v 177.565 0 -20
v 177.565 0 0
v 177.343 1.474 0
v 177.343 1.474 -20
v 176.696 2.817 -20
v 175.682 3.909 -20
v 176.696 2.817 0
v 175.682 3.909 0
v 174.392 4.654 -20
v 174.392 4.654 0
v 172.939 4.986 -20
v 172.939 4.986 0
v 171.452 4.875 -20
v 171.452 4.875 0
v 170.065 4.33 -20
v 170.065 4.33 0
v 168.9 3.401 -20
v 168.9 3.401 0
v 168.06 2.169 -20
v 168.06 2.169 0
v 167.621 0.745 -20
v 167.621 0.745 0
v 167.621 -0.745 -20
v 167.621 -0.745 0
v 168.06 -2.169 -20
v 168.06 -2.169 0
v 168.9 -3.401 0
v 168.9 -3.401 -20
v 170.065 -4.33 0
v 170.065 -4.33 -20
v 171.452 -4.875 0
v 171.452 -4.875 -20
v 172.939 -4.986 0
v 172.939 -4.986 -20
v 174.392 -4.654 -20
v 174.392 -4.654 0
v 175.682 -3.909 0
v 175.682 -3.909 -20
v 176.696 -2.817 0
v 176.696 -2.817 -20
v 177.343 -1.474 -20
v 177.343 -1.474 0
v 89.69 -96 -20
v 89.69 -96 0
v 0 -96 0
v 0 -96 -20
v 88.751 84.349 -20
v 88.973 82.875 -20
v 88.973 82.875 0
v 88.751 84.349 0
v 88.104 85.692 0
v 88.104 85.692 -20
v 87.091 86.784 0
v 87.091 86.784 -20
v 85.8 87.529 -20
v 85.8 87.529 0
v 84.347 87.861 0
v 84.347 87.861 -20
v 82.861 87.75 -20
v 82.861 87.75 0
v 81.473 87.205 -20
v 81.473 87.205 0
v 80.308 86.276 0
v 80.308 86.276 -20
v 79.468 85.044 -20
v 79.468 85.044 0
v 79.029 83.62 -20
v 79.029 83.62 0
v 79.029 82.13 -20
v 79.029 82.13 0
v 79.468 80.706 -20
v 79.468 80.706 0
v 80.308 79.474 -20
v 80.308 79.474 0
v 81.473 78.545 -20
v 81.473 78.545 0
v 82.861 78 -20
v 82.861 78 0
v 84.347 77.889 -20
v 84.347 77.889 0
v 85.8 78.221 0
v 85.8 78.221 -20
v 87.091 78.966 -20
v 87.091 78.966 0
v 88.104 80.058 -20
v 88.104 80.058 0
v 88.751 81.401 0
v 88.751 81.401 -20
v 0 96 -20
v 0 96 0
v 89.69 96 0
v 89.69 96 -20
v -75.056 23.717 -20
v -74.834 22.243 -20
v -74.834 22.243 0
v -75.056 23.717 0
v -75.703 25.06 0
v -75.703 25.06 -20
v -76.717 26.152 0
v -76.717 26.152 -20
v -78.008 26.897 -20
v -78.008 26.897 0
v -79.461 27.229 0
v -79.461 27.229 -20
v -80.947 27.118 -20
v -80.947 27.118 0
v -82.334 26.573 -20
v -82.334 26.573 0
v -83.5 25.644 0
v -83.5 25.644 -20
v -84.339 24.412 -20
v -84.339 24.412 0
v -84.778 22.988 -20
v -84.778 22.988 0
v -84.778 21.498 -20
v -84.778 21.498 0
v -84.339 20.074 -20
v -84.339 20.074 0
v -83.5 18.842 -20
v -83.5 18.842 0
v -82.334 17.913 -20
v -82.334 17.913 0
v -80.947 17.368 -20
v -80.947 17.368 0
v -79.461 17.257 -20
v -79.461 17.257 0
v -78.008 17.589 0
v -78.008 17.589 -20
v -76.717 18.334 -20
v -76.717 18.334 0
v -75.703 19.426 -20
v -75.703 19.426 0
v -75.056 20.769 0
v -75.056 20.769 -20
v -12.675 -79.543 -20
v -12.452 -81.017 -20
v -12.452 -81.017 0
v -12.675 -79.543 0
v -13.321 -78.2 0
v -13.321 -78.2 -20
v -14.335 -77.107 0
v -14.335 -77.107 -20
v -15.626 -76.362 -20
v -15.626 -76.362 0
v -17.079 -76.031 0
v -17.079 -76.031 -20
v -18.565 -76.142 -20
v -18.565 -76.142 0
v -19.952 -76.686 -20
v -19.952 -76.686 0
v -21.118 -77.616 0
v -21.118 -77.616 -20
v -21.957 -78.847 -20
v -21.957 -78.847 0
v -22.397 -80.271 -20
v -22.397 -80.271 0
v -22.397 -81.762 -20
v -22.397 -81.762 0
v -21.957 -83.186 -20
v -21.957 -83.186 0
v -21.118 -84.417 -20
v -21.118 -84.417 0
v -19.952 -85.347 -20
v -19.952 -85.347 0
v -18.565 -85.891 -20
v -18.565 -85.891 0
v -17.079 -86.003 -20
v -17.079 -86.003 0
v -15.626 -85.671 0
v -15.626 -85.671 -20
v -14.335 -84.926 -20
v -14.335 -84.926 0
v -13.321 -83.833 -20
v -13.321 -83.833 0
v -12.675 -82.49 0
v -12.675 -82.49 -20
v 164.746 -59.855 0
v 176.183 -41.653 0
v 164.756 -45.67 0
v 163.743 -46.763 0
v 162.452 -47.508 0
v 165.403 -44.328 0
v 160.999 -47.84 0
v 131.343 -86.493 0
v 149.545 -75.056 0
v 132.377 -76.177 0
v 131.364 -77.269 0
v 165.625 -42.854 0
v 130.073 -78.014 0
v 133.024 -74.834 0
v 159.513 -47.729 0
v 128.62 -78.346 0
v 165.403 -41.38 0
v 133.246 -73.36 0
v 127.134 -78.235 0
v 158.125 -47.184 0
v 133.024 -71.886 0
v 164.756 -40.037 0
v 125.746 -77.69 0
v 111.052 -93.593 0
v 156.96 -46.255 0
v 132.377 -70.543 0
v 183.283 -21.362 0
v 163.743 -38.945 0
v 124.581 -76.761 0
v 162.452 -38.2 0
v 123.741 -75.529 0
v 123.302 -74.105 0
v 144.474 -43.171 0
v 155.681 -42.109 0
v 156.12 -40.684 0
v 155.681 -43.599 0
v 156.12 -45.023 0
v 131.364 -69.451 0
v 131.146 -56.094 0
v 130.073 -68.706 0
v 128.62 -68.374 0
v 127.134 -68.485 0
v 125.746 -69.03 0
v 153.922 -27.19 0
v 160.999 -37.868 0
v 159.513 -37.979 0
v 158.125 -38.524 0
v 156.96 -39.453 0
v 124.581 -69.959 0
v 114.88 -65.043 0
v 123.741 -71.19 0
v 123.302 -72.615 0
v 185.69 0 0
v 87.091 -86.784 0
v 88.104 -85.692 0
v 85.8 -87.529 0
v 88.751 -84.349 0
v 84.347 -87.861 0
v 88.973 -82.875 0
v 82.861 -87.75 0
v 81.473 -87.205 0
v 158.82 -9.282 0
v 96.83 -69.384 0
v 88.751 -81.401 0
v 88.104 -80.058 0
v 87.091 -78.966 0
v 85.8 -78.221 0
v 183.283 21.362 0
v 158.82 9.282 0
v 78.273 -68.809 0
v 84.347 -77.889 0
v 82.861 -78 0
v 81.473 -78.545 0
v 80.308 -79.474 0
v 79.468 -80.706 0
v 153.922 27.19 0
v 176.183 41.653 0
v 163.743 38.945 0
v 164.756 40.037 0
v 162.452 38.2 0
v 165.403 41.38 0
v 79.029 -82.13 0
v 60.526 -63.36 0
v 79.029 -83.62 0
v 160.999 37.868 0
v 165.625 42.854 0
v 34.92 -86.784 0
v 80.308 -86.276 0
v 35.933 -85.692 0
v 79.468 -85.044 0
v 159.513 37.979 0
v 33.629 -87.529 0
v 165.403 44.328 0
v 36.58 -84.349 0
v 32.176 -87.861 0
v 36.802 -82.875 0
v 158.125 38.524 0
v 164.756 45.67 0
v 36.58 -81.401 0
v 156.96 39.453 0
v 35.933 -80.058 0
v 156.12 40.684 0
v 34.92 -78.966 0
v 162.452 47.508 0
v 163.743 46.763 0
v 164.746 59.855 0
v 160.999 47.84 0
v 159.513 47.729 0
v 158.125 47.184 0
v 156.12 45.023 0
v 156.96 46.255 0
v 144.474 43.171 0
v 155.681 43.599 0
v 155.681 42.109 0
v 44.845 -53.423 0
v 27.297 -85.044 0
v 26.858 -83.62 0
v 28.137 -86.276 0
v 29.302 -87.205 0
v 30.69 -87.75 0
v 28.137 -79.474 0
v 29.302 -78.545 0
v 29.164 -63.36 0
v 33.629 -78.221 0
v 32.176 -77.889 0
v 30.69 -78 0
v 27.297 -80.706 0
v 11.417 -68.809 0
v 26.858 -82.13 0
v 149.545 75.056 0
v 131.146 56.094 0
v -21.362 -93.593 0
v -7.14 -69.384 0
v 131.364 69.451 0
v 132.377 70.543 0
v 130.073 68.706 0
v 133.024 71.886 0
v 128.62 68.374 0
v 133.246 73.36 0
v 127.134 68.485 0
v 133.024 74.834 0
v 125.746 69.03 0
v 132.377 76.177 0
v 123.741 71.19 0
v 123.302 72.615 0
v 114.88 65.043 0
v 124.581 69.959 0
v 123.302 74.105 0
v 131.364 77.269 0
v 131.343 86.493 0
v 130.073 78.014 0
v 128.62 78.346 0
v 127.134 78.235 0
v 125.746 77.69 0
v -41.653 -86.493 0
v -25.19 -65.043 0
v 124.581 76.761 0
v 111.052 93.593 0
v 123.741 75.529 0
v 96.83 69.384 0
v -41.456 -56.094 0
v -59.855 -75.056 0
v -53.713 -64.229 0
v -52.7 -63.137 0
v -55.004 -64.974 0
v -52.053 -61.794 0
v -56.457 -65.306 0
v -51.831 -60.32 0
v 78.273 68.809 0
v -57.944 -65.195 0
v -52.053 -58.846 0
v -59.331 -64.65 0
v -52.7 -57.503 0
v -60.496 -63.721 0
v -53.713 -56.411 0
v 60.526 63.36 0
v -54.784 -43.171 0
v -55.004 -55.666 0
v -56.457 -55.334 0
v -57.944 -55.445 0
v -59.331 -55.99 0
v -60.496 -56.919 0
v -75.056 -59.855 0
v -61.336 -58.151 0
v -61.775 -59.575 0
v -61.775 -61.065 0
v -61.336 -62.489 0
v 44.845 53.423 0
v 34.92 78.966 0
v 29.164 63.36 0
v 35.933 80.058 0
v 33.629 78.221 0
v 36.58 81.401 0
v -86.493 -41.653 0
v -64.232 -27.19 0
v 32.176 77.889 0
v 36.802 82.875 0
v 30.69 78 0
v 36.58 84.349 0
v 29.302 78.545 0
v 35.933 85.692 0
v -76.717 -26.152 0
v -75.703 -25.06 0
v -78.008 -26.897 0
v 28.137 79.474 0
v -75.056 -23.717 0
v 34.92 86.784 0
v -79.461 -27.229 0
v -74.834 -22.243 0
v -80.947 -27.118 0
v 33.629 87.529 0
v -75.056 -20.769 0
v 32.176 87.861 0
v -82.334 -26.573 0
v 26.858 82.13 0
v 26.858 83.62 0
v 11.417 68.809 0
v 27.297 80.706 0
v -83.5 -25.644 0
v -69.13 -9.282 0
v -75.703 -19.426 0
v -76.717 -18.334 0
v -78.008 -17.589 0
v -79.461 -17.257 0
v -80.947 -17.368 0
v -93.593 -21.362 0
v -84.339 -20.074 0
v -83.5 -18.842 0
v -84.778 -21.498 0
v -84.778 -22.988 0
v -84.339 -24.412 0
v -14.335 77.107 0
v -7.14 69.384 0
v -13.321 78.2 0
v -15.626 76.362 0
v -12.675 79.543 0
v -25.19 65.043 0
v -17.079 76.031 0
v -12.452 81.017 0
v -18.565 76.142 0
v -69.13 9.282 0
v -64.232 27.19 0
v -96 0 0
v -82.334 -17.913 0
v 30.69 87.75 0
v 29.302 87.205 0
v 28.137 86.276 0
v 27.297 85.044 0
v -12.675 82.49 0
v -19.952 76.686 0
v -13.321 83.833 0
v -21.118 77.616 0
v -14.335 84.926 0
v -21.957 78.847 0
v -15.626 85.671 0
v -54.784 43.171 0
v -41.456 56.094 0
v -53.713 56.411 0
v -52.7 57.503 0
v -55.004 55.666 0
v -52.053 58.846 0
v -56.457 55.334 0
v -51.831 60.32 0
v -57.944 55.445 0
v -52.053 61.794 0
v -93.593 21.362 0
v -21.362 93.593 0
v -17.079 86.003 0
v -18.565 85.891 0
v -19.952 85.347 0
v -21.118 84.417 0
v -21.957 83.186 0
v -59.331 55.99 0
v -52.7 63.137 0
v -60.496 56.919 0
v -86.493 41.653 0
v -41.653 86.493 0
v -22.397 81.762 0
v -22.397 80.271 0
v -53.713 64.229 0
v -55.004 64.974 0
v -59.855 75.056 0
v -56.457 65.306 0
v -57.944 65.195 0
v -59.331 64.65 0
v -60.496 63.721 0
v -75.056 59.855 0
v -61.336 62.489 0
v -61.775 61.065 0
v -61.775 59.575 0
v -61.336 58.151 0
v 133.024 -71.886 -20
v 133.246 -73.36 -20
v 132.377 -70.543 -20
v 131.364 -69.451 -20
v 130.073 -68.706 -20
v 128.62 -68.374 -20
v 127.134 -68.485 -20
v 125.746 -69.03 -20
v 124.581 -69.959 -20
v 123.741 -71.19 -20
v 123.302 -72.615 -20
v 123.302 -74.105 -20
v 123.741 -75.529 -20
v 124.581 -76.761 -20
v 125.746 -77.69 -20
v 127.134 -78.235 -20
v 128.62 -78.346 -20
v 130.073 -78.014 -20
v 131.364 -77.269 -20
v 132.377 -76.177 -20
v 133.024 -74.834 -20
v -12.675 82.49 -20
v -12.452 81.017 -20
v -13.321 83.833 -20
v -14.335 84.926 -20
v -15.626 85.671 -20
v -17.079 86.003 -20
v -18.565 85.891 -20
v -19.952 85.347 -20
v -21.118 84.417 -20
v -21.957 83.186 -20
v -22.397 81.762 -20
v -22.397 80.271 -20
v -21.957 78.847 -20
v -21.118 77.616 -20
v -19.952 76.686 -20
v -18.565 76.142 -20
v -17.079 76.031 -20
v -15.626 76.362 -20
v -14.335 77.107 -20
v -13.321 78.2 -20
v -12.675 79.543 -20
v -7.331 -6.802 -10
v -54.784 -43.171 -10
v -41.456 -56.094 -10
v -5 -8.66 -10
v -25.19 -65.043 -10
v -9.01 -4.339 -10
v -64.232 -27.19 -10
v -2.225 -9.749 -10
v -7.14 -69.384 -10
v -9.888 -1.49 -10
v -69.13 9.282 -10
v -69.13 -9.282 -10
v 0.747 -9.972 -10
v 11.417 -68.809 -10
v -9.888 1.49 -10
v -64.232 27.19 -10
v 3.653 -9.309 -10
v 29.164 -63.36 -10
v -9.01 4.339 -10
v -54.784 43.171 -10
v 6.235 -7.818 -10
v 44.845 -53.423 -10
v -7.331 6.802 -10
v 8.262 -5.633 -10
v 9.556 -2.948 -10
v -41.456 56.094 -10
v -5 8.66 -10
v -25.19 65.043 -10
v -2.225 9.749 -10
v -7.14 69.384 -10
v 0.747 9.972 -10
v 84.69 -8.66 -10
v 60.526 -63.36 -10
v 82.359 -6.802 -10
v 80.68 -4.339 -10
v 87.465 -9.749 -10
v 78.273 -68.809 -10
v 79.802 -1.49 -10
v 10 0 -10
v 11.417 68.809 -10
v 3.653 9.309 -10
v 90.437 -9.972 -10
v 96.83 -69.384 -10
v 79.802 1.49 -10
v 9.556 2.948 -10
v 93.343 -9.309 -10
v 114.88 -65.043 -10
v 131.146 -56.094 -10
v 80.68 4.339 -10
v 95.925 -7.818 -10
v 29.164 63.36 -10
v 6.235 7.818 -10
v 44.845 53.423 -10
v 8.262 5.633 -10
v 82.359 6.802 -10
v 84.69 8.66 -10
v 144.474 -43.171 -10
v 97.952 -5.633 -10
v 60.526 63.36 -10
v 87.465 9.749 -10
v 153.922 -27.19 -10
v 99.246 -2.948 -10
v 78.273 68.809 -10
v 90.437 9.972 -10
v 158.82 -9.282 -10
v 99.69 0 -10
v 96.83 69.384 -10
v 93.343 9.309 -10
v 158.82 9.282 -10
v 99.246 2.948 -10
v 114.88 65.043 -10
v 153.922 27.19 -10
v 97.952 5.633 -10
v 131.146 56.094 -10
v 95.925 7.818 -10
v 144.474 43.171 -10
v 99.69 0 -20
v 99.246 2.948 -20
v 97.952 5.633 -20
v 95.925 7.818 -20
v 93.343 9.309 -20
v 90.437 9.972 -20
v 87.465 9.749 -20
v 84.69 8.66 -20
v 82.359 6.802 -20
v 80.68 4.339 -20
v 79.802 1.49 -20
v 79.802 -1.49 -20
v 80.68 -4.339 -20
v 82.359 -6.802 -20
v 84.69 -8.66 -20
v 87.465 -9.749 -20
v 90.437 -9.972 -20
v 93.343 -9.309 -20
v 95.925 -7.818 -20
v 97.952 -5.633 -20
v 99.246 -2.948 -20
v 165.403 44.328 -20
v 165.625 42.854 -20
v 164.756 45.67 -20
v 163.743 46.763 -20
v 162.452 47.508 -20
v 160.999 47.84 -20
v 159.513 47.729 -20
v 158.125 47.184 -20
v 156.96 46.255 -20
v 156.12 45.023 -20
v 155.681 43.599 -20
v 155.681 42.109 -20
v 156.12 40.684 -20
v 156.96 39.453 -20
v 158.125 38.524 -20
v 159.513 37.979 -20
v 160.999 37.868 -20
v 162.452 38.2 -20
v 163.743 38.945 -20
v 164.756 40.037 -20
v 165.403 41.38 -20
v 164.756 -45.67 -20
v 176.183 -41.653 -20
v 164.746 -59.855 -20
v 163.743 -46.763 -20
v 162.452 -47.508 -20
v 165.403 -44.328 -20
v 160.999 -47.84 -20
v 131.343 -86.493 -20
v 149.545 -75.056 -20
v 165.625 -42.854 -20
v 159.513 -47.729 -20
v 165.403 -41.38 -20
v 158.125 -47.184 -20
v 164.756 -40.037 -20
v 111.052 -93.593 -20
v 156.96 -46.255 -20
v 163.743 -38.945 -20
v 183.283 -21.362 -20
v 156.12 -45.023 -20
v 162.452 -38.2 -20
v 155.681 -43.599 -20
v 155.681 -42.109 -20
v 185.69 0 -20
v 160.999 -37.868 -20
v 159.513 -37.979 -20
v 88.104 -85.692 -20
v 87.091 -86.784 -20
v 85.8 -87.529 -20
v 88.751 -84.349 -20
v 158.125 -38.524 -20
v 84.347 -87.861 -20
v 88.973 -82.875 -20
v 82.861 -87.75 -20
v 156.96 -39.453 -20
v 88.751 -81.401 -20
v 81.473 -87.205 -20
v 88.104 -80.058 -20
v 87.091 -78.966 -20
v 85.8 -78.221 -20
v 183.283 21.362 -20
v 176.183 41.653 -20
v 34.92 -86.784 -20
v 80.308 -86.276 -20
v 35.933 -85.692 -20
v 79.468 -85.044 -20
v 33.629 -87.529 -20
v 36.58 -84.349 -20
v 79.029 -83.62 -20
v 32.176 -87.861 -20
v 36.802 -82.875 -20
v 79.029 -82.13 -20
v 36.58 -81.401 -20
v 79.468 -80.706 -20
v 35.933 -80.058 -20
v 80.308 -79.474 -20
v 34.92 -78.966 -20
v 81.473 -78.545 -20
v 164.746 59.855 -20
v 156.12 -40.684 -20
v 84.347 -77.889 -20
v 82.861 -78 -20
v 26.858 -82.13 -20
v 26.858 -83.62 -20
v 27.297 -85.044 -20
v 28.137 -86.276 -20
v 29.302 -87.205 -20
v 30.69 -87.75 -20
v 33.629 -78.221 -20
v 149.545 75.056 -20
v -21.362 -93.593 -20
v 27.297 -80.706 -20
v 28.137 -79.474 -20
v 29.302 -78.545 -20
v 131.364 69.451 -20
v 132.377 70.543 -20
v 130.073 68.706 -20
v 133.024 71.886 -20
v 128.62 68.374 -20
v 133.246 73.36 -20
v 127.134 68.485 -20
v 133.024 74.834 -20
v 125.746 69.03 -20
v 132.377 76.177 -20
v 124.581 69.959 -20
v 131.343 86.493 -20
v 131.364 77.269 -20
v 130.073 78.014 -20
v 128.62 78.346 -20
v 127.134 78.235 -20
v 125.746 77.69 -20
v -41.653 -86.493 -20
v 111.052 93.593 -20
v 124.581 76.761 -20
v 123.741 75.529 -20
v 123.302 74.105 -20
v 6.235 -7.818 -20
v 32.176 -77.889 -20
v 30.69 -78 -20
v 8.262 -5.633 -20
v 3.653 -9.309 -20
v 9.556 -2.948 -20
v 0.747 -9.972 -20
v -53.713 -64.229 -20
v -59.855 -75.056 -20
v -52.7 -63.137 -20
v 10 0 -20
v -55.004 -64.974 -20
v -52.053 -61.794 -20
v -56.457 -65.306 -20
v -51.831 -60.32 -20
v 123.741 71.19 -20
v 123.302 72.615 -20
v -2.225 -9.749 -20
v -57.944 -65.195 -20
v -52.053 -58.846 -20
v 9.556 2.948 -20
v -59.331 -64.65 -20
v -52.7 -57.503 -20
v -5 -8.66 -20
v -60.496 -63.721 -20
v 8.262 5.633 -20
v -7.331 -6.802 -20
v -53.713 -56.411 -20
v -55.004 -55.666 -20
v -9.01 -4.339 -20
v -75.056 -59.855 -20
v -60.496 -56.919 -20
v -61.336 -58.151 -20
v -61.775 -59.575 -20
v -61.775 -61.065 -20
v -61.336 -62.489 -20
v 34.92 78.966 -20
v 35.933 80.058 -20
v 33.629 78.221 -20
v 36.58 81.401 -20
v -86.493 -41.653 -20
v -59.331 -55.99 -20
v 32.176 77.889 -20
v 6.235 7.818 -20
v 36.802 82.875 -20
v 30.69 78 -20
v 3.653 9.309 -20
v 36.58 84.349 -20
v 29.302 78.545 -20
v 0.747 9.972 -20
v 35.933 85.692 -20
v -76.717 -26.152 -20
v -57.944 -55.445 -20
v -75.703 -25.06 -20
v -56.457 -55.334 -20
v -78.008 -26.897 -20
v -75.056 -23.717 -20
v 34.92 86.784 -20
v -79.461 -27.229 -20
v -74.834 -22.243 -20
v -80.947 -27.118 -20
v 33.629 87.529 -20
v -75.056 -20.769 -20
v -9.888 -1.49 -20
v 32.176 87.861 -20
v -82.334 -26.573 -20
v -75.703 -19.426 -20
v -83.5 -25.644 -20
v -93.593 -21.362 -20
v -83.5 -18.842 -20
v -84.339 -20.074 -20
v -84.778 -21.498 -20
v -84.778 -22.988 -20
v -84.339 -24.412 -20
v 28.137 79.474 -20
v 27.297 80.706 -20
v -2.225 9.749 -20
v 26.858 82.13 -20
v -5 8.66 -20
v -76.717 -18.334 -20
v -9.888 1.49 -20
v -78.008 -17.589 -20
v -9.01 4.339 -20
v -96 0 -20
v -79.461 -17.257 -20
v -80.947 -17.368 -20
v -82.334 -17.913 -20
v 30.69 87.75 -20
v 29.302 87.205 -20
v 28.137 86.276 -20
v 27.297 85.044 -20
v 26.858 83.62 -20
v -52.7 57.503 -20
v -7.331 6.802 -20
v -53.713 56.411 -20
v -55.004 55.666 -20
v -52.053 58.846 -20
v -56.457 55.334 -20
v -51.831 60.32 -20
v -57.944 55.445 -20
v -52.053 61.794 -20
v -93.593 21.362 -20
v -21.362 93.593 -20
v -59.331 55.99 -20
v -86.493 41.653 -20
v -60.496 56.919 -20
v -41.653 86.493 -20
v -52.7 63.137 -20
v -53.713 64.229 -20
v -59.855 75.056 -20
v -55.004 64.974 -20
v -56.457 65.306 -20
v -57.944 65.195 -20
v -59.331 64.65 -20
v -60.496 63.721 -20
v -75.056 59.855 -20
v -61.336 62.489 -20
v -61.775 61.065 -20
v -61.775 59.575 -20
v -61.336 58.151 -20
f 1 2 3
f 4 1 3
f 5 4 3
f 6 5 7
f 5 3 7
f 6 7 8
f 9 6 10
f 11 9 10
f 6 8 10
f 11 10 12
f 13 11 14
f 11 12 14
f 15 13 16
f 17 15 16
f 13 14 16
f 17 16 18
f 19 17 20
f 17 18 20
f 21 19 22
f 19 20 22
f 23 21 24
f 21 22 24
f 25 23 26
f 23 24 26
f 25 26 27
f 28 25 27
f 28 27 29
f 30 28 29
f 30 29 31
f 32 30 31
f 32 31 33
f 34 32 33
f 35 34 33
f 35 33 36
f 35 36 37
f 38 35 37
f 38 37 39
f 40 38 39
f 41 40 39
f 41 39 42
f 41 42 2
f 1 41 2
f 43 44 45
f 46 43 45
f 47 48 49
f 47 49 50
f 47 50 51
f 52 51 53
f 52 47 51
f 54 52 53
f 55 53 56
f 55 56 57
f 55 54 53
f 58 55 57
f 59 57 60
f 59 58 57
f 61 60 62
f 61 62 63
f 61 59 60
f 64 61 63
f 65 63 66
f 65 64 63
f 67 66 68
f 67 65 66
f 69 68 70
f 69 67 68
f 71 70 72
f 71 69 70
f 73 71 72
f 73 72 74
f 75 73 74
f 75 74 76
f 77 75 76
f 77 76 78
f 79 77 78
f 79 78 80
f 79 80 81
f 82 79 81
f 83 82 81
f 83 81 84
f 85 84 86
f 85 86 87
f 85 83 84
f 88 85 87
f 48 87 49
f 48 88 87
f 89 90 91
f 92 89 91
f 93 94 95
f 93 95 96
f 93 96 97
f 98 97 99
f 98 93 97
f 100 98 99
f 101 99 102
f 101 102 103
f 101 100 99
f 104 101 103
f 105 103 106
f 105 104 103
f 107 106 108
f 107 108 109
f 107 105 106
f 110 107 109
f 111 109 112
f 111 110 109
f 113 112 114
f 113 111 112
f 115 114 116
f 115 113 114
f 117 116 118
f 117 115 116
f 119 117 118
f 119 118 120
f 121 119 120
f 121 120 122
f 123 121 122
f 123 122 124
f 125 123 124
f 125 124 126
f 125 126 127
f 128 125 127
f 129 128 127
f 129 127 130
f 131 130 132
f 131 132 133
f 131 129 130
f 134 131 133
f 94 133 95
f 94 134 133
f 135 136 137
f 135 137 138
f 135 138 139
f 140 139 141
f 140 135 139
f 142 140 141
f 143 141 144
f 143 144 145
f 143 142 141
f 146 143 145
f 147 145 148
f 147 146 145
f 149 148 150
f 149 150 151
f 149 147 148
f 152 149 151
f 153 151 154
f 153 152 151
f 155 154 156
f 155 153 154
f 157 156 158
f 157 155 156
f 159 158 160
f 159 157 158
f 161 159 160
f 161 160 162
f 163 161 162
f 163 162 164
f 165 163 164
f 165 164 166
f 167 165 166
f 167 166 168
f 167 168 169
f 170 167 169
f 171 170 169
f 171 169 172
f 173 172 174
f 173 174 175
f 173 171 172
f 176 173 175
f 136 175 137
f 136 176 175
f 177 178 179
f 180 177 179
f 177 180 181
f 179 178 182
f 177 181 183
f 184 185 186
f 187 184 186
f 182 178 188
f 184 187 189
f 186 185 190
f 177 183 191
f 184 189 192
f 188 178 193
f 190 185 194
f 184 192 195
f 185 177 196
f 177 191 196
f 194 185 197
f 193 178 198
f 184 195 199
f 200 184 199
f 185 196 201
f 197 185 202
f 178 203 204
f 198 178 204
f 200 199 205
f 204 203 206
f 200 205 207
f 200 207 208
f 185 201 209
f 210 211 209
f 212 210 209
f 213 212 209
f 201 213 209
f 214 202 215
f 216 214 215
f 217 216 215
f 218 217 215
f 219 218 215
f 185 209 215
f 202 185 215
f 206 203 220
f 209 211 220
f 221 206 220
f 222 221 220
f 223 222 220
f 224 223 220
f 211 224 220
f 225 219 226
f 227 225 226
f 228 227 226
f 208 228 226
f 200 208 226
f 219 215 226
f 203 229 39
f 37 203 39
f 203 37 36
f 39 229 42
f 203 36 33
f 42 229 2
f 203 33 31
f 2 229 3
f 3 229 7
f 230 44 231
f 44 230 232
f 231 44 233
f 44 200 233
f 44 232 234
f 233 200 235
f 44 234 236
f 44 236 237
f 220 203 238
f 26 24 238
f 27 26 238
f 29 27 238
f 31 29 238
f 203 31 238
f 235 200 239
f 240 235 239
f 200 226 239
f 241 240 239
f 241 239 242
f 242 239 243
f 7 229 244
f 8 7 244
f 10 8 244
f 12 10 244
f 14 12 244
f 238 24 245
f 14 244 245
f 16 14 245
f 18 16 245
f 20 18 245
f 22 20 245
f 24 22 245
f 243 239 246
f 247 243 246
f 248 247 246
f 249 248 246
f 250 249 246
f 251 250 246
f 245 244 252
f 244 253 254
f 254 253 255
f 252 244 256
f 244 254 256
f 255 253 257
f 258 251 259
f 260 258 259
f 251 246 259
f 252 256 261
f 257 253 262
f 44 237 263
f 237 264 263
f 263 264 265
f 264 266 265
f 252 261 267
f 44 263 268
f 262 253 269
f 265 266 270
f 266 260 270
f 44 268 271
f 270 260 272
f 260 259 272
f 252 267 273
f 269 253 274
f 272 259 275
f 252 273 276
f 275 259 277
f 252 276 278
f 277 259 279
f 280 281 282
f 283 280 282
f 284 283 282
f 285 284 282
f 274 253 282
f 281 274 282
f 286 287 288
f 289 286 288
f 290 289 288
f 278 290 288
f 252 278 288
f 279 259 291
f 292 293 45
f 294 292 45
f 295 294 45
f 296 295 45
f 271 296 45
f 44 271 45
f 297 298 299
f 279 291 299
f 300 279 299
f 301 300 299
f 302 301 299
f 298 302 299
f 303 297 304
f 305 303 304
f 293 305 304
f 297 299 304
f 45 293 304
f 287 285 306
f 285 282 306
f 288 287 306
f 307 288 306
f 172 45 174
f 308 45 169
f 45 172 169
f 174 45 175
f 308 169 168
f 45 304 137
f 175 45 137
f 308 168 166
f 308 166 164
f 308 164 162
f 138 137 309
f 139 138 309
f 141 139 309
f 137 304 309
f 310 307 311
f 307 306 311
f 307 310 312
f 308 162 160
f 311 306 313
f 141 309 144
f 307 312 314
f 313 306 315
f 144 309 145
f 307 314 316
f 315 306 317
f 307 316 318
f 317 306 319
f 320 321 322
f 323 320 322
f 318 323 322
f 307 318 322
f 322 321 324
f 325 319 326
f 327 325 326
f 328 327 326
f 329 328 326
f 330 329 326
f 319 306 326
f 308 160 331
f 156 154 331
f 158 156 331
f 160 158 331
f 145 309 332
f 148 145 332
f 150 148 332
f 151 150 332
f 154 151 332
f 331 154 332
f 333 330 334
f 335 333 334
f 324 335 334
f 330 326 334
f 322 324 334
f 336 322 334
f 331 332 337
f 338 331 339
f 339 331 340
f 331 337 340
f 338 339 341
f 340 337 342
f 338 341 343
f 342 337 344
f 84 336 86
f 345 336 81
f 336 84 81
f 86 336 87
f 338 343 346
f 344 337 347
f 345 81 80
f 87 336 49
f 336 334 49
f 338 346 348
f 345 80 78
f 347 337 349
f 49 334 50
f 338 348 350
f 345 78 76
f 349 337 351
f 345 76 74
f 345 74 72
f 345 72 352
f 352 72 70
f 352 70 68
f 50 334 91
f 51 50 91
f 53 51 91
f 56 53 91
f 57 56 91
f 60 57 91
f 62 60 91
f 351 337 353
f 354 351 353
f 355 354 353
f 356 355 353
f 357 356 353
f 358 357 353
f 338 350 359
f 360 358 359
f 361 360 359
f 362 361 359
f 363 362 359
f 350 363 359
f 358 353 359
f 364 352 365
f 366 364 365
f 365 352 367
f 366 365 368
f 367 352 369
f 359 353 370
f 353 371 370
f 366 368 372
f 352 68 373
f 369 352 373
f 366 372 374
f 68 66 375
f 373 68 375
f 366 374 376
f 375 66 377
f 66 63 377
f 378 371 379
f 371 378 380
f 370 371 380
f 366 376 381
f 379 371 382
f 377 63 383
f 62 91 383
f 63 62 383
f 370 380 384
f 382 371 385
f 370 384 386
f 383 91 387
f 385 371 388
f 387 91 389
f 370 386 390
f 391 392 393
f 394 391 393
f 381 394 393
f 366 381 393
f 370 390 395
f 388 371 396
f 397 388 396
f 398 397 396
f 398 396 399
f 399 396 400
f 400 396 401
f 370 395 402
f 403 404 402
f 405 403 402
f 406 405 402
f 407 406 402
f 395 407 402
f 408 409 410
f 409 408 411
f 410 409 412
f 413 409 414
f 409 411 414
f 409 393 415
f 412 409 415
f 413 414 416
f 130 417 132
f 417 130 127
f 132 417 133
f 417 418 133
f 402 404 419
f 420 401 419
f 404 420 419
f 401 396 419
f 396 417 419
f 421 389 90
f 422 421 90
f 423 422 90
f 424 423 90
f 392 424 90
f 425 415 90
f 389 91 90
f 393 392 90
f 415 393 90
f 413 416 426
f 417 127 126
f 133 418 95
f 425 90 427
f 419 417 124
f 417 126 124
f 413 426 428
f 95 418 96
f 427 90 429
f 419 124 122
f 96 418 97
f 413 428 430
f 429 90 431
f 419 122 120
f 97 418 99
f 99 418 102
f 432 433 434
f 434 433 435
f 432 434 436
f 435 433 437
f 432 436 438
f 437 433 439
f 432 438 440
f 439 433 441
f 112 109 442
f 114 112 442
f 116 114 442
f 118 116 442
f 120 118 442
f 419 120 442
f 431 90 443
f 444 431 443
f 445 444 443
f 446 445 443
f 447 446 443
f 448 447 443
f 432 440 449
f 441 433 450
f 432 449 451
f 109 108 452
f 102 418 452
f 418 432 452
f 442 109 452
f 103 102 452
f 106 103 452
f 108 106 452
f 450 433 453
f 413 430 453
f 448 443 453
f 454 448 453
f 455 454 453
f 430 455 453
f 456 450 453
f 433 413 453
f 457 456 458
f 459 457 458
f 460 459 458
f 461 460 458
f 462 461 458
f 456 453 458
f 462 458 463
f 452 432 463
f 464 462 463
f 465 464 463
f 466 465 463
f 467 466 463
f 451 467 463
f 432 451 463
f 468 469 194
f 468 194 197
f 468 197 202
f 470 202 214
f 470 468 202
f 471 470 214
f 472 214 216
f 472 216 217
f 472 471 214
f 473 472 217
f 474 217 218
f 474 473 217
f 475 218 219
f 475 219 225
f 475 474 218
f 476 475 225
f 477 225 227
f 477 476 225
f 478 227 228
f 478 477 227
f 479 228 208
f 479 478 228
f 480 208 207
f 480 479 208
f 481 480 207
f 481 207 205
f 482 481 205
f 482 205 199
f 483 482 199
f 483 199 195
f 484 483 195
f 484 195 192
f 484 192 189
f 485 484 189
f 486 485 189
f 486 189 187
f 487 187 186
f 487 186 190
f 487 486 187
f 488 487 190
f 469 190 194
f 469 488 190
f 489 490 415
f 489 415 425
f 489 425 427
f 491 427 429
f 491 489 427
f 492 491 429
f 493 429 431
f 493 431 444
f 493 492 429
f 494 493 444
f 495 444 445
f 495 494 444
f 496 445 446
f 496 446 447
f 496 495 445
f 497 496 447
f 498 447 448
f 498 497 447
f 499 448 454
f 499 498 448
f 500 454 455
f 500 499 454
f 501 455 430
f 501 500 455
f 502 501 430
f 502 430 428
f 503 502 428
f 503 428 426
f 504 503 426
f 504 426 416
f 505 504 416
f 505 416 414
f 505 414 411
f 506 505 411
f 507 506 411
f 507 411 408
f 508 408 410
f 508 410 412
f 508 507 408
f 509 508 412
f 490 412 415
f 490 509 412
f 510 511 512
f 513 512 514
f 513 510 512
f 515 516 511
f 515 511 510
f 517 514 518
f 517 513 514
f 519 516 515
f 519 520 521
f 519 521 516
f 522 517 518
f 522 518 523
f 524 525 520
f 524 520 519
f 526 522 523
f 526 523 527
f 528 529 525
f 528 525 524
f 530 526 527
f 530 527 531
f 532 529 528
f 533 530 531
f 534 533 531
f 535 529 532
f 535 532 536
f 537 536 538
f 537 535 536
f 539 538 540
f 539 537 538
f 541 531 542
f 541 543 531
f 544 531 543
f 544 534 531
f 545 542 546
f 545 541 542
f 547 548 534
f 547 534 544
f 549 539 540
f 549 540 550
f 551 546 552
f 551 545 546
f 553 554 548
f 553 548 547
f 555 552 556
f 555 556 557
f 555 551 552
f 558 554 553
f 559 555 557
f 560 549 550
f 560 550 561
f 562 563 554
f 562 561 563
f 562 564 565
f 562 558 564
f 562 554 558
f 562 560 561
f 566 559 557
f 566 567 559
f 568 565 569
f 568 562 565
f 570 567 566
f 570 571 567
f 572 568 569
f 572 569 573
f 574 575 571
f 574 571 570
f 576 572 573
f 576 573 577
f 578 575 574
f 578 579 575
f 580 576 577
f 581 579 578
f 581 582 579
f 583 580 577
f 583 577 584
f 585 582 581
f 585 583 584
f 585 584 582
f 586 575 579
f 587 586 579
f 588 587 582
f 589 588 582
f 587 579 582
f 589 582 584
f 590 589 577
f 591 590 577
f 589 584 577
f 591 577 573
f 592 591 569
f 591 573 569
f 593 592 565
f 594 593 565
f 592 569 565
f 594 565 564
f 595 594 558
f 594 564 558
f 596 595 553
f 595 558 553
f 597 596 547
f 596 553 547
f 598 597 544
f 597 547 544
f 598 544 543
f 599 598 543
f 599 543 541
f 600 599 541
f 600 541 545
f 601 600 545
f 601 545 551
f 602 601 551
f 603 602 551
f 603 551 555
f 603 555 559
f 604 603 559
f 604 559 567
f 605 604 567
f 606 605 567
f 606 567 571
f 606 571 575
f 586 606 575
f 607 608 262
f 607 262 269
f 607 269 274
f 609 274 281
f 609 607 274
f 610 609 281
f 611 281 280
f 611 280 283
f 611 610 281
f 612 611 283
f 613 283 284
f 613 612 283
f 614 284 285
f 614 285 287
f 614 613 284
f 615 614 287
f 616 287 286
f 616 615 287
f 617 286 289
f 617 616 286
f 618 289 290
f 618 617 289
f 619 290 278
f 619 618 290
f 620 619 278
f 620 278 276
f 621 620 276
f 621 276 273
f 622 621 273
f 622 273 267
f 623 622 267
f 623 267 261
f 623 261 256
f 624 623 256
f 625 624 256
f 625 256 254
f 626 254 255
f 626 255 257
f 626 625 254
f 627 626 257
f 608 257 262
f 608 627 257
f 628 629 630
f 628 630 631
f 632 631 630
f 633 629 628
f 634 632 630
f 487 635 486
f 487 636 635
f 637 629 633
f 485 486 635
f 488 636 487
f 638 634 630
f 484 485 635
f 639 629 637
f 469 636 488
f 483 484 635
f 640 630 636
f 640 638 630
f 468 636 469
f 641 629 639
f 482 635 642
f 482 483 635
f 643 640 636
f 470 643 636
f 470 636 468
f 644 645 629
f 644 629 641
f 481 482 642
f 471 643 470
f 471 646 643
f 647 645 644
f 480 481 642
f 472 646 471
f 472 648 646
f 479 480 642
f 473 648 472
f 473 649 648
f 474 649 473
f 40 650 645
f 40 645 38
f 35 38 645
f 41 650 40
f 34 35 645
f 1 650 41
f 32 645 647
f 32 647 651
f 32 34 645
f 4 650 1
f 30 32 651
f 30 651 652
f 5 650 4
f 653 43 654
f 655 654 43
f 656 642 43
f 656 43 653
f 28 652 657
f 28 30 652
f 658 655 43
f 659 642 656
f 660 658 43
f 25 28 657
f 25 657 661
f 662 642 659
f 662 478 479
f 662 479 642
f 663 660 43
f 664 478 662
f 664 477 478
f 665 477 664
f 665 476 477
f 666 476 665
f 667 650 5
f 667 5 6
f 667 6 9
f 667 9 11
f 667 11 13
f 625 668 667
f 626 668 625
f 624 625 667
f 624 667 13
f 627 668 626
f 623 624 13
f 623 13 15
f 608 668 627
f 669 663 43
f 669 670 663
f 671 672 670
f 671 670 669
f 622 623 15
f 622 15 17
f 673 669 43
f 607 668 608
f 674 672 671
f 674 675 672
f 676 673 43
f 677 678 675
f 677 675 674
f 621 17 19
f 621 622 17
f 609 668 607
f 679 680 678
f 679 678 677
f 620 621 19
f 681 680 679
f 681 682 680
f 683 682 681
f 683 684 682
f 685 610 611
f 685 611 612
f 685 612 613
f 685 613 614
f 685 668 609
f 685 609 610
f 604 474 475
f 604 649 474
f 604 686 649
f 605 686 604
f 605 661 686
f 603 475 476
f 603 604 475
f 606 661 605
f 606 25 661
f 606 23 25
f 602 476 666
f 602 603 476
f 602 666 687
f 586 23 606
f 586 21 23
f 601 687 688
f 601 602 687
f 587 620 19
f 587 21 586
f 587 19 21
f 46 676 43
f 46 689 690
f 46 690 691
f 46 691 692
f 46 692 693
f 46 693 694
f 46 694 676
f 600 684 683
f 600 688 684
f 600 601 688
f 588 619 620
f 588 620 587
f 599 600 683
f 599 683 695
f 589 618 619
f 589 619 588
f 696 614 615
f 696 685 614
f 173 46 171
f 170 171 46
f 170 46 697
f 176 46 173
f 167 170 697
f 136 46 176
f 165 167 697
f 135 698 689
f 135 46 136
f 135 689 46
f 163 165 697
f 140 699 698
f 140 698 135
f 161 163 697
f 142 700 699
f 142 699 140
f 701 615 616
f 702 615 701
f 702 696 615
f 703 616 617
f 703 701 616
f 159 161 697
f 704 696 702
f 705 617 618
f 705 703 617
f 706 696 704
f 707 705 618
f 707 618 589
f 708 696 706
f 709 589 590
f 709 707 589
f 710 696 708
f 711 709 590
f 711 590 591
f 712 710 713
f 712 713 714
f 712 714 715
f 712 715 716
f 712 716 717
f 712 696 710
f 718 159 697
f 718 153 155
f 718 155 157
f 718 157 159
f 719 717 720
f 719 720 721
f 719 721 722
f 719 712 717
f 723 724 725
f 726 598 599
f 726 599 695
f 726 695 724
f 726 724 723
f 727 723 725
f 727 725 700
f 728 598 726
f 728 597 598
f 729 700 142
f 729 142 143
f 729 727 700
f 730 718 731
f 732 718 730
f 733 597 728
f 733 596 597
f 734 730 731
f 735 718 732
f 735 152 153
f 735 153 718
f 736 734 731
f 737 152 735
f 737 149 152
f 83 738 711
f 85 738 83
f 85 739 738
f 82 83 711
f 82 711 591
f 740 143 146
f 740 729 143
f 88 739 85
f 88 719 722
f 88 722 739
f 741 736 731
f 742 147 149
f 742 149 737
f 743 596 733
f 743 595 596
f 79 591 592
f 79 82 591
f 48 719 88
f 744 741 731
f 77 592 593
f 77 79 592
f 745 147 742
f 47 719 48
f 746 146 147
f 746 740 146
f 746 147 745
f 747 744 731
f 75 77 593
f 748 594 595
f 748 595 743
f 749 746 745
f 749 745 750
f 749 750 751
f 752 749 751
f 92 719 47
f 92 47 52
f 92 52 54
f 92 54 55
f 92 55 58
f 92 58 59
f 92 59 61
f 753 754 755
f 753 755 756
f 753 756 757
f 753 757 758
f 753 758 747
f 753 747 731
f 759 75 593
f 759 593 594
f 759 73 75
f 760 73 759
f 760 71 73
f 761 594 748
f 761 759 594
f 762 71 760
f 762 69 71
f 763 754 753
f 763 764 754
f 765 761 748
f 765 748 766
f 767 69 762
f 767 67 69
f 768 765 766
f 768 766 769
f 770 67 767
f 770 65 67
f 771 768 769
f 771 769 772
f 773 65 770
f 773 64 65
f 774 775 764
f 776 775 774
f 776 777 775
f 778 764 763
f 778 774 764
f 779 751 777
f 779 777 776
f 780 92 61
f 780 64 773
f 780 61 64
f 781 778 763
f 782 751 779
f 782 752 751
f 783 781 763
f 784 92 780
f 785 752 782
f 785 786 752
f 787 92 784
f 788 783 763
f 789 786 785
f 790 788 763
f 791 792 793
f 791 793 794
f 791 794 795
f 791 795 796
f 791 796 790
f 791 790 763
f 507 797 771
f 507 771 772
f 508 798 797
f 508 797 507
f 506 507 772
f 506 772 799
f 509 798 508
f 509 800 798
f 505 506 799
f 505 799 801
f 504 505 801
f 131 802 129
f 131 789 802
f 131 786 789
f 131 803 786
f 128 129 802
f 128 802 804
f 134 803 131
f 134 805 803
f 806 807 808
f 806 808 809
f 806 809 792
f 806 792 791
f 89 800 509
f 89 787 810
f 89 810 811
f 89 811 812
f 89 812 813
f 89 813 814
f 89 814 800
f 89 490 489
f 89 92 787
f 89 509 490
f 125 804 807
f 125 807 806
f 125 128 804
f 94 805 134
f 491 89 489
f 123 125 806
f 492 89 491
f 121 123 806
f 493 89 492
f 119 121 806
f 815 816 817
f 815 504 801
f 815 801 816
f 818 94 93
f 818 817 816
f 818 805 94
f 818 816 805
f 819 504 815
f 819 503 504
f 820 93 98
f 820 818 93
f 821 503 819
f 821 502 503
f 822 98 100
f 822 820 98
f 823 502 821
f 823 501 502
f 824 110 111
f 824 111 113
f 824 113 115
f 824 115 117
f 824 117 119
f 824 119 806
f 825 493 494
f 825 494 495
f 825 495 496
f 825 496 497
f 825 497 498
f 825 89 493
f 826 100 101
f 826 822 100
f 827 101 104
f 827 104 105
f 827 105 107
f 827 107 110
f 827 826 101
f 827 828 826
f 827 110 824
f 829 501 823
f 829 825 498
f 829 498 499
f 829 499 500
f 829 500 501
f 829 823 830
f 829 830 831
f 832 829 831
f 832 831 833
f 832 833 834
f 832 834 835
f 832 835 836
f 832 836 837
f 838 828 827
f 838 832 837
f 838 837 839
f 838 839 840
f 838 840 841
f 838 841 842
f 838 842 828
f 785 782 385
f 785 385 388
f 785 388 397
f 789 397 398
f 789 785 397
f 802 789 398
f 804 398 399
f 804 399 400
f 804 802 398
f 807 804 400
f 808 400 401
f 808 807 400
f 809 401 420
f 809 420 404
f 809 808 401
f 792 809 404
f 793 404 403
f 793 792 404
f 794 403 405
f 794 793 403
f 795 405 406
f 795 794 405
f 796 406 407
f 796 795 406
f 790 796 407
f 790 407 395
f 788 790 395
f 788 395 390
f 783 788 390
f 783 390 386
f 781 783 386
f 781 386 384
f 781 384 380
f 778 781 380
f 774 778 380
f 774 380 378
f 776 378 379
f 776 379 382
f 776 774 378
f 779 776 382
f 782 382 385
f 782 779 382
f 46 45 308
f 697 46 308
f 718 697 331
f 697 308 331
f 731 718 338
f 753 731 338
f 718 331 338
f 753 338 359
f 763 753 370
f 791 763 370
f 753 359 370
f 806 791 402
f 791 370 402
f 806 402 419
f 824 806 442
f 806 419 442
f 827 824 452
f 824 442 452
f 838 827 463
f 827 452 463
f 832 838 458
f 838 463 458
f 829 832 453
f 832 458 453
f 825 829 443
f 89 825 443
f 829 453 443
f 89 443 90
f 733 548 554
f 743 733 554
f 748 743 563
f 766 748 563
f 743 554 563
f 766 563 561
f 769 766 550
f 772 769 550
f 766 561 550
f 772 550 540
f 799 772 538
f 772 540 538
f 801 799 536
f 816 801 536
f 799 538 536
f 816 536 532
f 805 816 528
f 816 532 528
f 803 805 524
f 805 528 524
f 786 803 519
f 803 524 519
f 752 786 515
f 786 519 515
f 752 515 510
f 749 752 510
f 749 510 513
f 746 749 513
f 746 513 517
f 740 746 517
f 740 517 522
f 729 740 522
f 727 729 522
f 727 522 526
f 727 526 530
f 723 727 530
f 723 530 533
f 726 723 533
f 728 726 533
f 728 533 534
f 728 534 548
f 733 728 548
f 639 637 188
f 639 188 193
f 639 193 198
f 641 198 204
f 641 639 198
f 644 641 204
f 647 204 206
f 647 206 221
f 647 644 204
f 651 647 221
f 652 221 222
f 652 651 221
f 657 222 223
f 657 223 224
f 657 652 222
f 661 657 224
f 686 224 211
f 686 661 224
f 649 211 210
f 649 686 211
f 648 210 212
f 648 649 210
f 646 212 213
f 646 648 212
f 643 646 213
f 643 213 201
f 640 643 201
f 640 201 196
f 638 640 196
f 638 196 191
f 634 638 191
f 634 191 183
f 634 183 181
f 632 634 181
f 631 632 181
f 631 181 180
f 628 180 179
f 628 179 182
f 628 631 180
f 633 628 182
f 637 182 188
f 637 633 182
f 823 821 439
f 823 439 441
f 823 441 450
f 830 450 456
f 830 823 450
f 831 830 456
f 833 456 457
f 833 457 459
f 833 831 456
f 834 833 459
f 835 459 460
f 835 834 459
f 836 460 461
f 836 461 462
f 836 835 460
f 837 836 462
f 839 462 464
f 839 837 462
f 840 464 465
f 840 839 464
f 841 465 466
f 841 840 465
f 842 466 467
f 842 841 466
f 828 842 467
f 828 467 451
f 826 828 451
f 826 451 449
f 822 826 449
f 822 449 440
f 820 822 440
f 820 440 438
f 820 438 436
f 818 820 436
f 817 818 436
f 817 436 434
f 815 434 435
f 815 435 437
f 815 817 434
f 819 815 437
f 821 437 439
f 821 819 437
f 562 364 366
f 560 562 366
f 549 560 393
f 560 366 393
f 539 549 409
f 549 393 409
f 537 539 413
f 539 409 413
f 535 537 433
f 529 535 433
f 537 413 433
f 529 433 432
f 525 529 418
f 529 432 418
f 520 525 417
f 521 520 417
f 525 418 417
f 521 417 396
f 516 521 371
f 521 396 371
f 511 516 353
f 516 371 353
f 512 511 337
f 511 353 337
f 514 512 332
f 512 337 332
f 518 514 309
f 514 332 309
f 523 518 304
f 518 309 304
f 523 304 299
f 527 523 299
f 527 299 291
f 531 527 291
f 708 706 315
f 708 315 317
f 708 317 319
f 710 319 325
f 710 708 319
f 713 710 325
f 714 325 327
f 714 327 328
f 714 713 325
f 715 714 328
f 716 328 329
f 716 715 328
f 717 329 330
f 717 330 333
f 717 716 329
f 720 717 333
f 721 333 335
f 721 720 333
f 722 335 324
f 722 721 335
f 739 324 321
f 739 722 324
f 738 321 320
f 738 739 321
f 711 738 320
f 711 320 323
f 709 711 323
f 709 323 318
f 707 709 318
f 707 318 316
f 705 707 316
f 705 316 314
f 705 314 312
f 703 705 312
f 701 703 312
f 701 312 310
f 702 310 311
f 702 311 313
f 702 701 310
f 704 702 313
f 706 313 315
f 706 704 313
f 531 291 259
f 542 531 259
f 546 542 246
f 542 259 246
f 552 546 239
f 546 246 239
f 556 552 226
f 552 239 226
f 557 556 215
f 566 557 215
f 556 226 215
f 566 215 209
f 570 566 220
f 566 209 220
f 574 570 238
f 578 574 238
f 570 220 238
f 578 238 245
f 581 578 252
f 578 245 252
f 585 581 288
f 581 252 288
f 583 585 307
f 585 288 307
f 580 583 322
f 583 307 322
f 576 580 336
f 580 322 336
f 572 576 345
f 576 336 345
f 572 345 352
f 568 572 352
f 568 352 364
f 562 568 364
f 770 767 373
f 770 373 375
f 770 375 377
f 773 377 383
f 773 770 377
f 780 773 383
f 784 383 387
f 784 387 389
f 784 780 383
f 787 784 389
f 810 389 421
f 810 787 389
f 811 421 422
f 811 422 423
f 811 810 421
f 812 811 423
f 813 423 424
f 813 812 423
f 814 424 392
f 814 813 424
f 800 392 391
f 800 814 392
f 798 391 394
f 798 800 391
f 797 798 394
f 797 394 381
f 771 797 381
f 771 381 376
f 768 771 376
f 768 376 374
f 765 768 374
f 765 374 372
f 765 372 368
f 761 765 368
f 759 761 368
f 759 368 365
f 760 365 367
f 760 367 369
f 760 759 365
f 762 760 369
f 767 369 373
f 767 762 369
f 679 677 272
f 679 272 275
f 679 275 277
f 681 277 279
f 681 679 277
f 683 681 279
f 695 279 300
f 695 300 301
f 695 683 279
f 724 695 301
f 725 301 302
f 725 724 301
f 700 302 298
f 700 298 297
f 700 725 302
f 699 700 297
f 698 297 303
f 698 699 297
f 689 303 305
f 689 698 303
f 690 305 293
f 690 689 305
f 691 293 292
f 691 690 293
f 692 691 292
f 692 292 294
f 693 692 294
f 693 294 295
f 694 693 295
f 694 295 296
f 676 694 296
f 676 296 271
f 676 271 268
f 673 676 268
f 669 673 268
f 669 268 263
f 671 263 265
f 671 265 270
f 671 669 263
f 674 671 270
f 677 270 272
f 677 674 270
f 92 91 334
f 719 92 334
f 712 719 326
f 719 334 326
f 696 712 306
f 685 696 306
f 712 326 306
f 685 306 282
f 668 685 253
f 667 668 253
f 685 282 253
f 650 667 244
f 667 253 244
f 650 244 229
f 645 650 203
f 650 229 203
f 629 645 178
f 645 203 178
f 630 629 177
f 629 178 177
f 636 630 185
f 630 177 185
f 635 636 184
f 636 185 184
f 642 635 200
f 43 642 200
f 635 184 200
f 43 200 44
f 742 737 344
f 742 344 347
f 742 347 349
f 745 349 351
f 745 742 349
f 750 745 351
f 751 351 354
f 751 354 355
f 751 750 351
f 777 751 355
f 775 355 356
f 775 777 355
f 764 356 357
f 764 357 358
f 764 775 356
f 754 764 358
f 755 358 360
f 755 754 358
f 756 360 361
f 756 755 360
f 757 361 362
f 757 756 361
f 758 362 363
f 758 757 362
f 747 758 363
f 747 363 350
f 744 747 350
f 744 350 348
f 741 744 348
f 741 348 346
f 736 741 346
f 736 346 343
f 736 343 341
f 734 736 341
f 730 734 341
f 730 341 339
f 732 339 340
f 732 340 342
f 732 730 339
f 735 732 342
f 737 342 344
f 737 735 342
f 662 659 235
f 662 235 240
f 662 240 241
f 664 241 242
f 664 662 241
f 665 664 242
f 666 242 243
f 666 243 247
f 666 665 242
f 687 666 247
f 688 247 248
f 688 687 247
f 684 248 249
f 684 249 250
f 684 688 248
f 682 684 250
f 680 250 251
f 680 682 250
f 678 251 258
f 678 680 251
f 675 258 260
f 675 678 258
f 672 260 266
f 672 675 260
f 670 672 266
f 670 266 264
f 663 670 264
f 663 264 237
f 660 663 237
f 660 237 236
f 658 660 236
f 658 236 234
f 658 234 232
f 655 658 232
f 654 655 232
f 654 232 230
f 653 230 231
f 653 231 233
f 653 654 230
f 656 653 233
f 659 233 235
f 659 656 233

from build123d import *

# Parameters (mm, degrees)
BOSS_EXTRUDE1_DEPTH   = 20
CUT_EXTRUDE1_DEPTH    = 10
SKETCH3_R             = 10
CUT_EXTRUDE2_DEPTH    = 210.276793028
SKETCH4_R             = 5
CUT_EXTRUDE3_DEPTH    = 210.992323907
CRVPATTERN1_START     = -20
CRVPATTERN1_OUTLINE_R = 5
CRVPATTERN1_DEPTH     = 20


# Read off the part's stored shape, not the designer's step: CrvPattern1
with BuildPart() as part:
    # Sketch1 → Boss-Extrude1 (new body)
    with BuildSketch(Plane.XY):
        with BuildLine():
            Line((0, 96), (89.69, 96))
            ThreePointArc((89.69, 96), (185.69, 0), (89.69, -96))
            Line((89.69, -96), (0, -96))
            ThreePointArc((0, -96), (-96, 0), (0, 96))
        make_face()
    extrude(amount=-BOSS_EXTRUDE1_DEPTH)

    # Sketch2 → Cut-Extrude1 (cut)
    with BuildSketch(Plane.XY):
        with BuildLine():
            ThreePointArc((44.845, 53.422733691), (-69.75, 0), (44.845, -53.422733691))
            ThreePointArc((44.845, -53.422733691), (159.44, 0), (44.845, 53.422733691))
        make_face()
    extrude(amount=-CUT_EXTRUDE1_DEPTH, mode=Mode.SUBTRACT)

    # Sketch3 → Cut-Extrude2 (cut, through all)
    with BuildSketch(Plane.XY.offset(-10)):
        Circle(SKETCH3_R)
        with Locations((89.69, 0)):
            Circle(SKETCH3_R)
    extrude(amount=-CUT_EXTRUDE2_DEPTH, mode=Mode.SUBTRACT)

    # Sketch4 → Cut-Extrude3 (cut, through all)
    with BuildSketch(Plane.XY):
        with Locations((172.565, 0)):
            Circle(SKETCH4_R)
    extrude(amount=-CUT_EXTRUDE3_DEPTH, mode=Mode.SUBTRACT)

    # CrvPattern1 outline → CrvPattern1 (cut)
    with BuildSketch(Plane.XY.offset(CRVPATTERN1_START)):
        with Locations((160.625248894, 42.853892348)):
            Circle(CRVPATTERN1_OUTLINE_R)
        with Locations((160.625248894, -42.853892348)):
            Circle(CRVPATTERN1_OUTLINE_R)
        with Locations((128.24630101, -73.359916013)):
            Circle(CRVPATTERN1_OUTLINE_R)
        with Locations((83.973289474, -82.875)):
            Circle(CRVPATTERN1_OUTLINE_R)
        with Locations((31.802236842, -82.875)):
            Circle(CRVPATTERN1_OUTLINE_R)
        with Locations((-17.452379652, -81.01654195)):
            Circle(CRVPATTERN1_OUTLINE_R)
        with Locations((-56.830926836, -60.320074436)):
            Circle(CRVPATTERN1_OUTLINE_R)
        with Locations((-79.834279533, -22.243053668)):
            Circle(CRVPATTERN1_OUTLINE_R)
        with Locations((-79.834279533, 22.243053668)):
            Circle(CRVPATTERN1_OUTLINE_R)
        with Locations((-56.830926836, 60.320074436)):
            Circle(CRVPATTERN1_OUTLINE_R)
        with Locations((-17.452379652, 81.01654195)):
            Circle(CRVPATTERN1_OUTLINE_R)
        with Locations((31.802236842, 82.875)):
            Circle(CRVPATTERN1_OUTLINE_R)
        with Locations((83.973289474, 82.875)):
            Circle(CRVPATTERN1_OUTLINE_R)
        with Locations((128.24630101, 73.359916013)):
            Circle(CRVPATTERN1_OUTLINE_R)
    extrude(amount=CRVPATTERN1_DEPTH, mode=Mode.SUBTRACT)


solid = part.part
